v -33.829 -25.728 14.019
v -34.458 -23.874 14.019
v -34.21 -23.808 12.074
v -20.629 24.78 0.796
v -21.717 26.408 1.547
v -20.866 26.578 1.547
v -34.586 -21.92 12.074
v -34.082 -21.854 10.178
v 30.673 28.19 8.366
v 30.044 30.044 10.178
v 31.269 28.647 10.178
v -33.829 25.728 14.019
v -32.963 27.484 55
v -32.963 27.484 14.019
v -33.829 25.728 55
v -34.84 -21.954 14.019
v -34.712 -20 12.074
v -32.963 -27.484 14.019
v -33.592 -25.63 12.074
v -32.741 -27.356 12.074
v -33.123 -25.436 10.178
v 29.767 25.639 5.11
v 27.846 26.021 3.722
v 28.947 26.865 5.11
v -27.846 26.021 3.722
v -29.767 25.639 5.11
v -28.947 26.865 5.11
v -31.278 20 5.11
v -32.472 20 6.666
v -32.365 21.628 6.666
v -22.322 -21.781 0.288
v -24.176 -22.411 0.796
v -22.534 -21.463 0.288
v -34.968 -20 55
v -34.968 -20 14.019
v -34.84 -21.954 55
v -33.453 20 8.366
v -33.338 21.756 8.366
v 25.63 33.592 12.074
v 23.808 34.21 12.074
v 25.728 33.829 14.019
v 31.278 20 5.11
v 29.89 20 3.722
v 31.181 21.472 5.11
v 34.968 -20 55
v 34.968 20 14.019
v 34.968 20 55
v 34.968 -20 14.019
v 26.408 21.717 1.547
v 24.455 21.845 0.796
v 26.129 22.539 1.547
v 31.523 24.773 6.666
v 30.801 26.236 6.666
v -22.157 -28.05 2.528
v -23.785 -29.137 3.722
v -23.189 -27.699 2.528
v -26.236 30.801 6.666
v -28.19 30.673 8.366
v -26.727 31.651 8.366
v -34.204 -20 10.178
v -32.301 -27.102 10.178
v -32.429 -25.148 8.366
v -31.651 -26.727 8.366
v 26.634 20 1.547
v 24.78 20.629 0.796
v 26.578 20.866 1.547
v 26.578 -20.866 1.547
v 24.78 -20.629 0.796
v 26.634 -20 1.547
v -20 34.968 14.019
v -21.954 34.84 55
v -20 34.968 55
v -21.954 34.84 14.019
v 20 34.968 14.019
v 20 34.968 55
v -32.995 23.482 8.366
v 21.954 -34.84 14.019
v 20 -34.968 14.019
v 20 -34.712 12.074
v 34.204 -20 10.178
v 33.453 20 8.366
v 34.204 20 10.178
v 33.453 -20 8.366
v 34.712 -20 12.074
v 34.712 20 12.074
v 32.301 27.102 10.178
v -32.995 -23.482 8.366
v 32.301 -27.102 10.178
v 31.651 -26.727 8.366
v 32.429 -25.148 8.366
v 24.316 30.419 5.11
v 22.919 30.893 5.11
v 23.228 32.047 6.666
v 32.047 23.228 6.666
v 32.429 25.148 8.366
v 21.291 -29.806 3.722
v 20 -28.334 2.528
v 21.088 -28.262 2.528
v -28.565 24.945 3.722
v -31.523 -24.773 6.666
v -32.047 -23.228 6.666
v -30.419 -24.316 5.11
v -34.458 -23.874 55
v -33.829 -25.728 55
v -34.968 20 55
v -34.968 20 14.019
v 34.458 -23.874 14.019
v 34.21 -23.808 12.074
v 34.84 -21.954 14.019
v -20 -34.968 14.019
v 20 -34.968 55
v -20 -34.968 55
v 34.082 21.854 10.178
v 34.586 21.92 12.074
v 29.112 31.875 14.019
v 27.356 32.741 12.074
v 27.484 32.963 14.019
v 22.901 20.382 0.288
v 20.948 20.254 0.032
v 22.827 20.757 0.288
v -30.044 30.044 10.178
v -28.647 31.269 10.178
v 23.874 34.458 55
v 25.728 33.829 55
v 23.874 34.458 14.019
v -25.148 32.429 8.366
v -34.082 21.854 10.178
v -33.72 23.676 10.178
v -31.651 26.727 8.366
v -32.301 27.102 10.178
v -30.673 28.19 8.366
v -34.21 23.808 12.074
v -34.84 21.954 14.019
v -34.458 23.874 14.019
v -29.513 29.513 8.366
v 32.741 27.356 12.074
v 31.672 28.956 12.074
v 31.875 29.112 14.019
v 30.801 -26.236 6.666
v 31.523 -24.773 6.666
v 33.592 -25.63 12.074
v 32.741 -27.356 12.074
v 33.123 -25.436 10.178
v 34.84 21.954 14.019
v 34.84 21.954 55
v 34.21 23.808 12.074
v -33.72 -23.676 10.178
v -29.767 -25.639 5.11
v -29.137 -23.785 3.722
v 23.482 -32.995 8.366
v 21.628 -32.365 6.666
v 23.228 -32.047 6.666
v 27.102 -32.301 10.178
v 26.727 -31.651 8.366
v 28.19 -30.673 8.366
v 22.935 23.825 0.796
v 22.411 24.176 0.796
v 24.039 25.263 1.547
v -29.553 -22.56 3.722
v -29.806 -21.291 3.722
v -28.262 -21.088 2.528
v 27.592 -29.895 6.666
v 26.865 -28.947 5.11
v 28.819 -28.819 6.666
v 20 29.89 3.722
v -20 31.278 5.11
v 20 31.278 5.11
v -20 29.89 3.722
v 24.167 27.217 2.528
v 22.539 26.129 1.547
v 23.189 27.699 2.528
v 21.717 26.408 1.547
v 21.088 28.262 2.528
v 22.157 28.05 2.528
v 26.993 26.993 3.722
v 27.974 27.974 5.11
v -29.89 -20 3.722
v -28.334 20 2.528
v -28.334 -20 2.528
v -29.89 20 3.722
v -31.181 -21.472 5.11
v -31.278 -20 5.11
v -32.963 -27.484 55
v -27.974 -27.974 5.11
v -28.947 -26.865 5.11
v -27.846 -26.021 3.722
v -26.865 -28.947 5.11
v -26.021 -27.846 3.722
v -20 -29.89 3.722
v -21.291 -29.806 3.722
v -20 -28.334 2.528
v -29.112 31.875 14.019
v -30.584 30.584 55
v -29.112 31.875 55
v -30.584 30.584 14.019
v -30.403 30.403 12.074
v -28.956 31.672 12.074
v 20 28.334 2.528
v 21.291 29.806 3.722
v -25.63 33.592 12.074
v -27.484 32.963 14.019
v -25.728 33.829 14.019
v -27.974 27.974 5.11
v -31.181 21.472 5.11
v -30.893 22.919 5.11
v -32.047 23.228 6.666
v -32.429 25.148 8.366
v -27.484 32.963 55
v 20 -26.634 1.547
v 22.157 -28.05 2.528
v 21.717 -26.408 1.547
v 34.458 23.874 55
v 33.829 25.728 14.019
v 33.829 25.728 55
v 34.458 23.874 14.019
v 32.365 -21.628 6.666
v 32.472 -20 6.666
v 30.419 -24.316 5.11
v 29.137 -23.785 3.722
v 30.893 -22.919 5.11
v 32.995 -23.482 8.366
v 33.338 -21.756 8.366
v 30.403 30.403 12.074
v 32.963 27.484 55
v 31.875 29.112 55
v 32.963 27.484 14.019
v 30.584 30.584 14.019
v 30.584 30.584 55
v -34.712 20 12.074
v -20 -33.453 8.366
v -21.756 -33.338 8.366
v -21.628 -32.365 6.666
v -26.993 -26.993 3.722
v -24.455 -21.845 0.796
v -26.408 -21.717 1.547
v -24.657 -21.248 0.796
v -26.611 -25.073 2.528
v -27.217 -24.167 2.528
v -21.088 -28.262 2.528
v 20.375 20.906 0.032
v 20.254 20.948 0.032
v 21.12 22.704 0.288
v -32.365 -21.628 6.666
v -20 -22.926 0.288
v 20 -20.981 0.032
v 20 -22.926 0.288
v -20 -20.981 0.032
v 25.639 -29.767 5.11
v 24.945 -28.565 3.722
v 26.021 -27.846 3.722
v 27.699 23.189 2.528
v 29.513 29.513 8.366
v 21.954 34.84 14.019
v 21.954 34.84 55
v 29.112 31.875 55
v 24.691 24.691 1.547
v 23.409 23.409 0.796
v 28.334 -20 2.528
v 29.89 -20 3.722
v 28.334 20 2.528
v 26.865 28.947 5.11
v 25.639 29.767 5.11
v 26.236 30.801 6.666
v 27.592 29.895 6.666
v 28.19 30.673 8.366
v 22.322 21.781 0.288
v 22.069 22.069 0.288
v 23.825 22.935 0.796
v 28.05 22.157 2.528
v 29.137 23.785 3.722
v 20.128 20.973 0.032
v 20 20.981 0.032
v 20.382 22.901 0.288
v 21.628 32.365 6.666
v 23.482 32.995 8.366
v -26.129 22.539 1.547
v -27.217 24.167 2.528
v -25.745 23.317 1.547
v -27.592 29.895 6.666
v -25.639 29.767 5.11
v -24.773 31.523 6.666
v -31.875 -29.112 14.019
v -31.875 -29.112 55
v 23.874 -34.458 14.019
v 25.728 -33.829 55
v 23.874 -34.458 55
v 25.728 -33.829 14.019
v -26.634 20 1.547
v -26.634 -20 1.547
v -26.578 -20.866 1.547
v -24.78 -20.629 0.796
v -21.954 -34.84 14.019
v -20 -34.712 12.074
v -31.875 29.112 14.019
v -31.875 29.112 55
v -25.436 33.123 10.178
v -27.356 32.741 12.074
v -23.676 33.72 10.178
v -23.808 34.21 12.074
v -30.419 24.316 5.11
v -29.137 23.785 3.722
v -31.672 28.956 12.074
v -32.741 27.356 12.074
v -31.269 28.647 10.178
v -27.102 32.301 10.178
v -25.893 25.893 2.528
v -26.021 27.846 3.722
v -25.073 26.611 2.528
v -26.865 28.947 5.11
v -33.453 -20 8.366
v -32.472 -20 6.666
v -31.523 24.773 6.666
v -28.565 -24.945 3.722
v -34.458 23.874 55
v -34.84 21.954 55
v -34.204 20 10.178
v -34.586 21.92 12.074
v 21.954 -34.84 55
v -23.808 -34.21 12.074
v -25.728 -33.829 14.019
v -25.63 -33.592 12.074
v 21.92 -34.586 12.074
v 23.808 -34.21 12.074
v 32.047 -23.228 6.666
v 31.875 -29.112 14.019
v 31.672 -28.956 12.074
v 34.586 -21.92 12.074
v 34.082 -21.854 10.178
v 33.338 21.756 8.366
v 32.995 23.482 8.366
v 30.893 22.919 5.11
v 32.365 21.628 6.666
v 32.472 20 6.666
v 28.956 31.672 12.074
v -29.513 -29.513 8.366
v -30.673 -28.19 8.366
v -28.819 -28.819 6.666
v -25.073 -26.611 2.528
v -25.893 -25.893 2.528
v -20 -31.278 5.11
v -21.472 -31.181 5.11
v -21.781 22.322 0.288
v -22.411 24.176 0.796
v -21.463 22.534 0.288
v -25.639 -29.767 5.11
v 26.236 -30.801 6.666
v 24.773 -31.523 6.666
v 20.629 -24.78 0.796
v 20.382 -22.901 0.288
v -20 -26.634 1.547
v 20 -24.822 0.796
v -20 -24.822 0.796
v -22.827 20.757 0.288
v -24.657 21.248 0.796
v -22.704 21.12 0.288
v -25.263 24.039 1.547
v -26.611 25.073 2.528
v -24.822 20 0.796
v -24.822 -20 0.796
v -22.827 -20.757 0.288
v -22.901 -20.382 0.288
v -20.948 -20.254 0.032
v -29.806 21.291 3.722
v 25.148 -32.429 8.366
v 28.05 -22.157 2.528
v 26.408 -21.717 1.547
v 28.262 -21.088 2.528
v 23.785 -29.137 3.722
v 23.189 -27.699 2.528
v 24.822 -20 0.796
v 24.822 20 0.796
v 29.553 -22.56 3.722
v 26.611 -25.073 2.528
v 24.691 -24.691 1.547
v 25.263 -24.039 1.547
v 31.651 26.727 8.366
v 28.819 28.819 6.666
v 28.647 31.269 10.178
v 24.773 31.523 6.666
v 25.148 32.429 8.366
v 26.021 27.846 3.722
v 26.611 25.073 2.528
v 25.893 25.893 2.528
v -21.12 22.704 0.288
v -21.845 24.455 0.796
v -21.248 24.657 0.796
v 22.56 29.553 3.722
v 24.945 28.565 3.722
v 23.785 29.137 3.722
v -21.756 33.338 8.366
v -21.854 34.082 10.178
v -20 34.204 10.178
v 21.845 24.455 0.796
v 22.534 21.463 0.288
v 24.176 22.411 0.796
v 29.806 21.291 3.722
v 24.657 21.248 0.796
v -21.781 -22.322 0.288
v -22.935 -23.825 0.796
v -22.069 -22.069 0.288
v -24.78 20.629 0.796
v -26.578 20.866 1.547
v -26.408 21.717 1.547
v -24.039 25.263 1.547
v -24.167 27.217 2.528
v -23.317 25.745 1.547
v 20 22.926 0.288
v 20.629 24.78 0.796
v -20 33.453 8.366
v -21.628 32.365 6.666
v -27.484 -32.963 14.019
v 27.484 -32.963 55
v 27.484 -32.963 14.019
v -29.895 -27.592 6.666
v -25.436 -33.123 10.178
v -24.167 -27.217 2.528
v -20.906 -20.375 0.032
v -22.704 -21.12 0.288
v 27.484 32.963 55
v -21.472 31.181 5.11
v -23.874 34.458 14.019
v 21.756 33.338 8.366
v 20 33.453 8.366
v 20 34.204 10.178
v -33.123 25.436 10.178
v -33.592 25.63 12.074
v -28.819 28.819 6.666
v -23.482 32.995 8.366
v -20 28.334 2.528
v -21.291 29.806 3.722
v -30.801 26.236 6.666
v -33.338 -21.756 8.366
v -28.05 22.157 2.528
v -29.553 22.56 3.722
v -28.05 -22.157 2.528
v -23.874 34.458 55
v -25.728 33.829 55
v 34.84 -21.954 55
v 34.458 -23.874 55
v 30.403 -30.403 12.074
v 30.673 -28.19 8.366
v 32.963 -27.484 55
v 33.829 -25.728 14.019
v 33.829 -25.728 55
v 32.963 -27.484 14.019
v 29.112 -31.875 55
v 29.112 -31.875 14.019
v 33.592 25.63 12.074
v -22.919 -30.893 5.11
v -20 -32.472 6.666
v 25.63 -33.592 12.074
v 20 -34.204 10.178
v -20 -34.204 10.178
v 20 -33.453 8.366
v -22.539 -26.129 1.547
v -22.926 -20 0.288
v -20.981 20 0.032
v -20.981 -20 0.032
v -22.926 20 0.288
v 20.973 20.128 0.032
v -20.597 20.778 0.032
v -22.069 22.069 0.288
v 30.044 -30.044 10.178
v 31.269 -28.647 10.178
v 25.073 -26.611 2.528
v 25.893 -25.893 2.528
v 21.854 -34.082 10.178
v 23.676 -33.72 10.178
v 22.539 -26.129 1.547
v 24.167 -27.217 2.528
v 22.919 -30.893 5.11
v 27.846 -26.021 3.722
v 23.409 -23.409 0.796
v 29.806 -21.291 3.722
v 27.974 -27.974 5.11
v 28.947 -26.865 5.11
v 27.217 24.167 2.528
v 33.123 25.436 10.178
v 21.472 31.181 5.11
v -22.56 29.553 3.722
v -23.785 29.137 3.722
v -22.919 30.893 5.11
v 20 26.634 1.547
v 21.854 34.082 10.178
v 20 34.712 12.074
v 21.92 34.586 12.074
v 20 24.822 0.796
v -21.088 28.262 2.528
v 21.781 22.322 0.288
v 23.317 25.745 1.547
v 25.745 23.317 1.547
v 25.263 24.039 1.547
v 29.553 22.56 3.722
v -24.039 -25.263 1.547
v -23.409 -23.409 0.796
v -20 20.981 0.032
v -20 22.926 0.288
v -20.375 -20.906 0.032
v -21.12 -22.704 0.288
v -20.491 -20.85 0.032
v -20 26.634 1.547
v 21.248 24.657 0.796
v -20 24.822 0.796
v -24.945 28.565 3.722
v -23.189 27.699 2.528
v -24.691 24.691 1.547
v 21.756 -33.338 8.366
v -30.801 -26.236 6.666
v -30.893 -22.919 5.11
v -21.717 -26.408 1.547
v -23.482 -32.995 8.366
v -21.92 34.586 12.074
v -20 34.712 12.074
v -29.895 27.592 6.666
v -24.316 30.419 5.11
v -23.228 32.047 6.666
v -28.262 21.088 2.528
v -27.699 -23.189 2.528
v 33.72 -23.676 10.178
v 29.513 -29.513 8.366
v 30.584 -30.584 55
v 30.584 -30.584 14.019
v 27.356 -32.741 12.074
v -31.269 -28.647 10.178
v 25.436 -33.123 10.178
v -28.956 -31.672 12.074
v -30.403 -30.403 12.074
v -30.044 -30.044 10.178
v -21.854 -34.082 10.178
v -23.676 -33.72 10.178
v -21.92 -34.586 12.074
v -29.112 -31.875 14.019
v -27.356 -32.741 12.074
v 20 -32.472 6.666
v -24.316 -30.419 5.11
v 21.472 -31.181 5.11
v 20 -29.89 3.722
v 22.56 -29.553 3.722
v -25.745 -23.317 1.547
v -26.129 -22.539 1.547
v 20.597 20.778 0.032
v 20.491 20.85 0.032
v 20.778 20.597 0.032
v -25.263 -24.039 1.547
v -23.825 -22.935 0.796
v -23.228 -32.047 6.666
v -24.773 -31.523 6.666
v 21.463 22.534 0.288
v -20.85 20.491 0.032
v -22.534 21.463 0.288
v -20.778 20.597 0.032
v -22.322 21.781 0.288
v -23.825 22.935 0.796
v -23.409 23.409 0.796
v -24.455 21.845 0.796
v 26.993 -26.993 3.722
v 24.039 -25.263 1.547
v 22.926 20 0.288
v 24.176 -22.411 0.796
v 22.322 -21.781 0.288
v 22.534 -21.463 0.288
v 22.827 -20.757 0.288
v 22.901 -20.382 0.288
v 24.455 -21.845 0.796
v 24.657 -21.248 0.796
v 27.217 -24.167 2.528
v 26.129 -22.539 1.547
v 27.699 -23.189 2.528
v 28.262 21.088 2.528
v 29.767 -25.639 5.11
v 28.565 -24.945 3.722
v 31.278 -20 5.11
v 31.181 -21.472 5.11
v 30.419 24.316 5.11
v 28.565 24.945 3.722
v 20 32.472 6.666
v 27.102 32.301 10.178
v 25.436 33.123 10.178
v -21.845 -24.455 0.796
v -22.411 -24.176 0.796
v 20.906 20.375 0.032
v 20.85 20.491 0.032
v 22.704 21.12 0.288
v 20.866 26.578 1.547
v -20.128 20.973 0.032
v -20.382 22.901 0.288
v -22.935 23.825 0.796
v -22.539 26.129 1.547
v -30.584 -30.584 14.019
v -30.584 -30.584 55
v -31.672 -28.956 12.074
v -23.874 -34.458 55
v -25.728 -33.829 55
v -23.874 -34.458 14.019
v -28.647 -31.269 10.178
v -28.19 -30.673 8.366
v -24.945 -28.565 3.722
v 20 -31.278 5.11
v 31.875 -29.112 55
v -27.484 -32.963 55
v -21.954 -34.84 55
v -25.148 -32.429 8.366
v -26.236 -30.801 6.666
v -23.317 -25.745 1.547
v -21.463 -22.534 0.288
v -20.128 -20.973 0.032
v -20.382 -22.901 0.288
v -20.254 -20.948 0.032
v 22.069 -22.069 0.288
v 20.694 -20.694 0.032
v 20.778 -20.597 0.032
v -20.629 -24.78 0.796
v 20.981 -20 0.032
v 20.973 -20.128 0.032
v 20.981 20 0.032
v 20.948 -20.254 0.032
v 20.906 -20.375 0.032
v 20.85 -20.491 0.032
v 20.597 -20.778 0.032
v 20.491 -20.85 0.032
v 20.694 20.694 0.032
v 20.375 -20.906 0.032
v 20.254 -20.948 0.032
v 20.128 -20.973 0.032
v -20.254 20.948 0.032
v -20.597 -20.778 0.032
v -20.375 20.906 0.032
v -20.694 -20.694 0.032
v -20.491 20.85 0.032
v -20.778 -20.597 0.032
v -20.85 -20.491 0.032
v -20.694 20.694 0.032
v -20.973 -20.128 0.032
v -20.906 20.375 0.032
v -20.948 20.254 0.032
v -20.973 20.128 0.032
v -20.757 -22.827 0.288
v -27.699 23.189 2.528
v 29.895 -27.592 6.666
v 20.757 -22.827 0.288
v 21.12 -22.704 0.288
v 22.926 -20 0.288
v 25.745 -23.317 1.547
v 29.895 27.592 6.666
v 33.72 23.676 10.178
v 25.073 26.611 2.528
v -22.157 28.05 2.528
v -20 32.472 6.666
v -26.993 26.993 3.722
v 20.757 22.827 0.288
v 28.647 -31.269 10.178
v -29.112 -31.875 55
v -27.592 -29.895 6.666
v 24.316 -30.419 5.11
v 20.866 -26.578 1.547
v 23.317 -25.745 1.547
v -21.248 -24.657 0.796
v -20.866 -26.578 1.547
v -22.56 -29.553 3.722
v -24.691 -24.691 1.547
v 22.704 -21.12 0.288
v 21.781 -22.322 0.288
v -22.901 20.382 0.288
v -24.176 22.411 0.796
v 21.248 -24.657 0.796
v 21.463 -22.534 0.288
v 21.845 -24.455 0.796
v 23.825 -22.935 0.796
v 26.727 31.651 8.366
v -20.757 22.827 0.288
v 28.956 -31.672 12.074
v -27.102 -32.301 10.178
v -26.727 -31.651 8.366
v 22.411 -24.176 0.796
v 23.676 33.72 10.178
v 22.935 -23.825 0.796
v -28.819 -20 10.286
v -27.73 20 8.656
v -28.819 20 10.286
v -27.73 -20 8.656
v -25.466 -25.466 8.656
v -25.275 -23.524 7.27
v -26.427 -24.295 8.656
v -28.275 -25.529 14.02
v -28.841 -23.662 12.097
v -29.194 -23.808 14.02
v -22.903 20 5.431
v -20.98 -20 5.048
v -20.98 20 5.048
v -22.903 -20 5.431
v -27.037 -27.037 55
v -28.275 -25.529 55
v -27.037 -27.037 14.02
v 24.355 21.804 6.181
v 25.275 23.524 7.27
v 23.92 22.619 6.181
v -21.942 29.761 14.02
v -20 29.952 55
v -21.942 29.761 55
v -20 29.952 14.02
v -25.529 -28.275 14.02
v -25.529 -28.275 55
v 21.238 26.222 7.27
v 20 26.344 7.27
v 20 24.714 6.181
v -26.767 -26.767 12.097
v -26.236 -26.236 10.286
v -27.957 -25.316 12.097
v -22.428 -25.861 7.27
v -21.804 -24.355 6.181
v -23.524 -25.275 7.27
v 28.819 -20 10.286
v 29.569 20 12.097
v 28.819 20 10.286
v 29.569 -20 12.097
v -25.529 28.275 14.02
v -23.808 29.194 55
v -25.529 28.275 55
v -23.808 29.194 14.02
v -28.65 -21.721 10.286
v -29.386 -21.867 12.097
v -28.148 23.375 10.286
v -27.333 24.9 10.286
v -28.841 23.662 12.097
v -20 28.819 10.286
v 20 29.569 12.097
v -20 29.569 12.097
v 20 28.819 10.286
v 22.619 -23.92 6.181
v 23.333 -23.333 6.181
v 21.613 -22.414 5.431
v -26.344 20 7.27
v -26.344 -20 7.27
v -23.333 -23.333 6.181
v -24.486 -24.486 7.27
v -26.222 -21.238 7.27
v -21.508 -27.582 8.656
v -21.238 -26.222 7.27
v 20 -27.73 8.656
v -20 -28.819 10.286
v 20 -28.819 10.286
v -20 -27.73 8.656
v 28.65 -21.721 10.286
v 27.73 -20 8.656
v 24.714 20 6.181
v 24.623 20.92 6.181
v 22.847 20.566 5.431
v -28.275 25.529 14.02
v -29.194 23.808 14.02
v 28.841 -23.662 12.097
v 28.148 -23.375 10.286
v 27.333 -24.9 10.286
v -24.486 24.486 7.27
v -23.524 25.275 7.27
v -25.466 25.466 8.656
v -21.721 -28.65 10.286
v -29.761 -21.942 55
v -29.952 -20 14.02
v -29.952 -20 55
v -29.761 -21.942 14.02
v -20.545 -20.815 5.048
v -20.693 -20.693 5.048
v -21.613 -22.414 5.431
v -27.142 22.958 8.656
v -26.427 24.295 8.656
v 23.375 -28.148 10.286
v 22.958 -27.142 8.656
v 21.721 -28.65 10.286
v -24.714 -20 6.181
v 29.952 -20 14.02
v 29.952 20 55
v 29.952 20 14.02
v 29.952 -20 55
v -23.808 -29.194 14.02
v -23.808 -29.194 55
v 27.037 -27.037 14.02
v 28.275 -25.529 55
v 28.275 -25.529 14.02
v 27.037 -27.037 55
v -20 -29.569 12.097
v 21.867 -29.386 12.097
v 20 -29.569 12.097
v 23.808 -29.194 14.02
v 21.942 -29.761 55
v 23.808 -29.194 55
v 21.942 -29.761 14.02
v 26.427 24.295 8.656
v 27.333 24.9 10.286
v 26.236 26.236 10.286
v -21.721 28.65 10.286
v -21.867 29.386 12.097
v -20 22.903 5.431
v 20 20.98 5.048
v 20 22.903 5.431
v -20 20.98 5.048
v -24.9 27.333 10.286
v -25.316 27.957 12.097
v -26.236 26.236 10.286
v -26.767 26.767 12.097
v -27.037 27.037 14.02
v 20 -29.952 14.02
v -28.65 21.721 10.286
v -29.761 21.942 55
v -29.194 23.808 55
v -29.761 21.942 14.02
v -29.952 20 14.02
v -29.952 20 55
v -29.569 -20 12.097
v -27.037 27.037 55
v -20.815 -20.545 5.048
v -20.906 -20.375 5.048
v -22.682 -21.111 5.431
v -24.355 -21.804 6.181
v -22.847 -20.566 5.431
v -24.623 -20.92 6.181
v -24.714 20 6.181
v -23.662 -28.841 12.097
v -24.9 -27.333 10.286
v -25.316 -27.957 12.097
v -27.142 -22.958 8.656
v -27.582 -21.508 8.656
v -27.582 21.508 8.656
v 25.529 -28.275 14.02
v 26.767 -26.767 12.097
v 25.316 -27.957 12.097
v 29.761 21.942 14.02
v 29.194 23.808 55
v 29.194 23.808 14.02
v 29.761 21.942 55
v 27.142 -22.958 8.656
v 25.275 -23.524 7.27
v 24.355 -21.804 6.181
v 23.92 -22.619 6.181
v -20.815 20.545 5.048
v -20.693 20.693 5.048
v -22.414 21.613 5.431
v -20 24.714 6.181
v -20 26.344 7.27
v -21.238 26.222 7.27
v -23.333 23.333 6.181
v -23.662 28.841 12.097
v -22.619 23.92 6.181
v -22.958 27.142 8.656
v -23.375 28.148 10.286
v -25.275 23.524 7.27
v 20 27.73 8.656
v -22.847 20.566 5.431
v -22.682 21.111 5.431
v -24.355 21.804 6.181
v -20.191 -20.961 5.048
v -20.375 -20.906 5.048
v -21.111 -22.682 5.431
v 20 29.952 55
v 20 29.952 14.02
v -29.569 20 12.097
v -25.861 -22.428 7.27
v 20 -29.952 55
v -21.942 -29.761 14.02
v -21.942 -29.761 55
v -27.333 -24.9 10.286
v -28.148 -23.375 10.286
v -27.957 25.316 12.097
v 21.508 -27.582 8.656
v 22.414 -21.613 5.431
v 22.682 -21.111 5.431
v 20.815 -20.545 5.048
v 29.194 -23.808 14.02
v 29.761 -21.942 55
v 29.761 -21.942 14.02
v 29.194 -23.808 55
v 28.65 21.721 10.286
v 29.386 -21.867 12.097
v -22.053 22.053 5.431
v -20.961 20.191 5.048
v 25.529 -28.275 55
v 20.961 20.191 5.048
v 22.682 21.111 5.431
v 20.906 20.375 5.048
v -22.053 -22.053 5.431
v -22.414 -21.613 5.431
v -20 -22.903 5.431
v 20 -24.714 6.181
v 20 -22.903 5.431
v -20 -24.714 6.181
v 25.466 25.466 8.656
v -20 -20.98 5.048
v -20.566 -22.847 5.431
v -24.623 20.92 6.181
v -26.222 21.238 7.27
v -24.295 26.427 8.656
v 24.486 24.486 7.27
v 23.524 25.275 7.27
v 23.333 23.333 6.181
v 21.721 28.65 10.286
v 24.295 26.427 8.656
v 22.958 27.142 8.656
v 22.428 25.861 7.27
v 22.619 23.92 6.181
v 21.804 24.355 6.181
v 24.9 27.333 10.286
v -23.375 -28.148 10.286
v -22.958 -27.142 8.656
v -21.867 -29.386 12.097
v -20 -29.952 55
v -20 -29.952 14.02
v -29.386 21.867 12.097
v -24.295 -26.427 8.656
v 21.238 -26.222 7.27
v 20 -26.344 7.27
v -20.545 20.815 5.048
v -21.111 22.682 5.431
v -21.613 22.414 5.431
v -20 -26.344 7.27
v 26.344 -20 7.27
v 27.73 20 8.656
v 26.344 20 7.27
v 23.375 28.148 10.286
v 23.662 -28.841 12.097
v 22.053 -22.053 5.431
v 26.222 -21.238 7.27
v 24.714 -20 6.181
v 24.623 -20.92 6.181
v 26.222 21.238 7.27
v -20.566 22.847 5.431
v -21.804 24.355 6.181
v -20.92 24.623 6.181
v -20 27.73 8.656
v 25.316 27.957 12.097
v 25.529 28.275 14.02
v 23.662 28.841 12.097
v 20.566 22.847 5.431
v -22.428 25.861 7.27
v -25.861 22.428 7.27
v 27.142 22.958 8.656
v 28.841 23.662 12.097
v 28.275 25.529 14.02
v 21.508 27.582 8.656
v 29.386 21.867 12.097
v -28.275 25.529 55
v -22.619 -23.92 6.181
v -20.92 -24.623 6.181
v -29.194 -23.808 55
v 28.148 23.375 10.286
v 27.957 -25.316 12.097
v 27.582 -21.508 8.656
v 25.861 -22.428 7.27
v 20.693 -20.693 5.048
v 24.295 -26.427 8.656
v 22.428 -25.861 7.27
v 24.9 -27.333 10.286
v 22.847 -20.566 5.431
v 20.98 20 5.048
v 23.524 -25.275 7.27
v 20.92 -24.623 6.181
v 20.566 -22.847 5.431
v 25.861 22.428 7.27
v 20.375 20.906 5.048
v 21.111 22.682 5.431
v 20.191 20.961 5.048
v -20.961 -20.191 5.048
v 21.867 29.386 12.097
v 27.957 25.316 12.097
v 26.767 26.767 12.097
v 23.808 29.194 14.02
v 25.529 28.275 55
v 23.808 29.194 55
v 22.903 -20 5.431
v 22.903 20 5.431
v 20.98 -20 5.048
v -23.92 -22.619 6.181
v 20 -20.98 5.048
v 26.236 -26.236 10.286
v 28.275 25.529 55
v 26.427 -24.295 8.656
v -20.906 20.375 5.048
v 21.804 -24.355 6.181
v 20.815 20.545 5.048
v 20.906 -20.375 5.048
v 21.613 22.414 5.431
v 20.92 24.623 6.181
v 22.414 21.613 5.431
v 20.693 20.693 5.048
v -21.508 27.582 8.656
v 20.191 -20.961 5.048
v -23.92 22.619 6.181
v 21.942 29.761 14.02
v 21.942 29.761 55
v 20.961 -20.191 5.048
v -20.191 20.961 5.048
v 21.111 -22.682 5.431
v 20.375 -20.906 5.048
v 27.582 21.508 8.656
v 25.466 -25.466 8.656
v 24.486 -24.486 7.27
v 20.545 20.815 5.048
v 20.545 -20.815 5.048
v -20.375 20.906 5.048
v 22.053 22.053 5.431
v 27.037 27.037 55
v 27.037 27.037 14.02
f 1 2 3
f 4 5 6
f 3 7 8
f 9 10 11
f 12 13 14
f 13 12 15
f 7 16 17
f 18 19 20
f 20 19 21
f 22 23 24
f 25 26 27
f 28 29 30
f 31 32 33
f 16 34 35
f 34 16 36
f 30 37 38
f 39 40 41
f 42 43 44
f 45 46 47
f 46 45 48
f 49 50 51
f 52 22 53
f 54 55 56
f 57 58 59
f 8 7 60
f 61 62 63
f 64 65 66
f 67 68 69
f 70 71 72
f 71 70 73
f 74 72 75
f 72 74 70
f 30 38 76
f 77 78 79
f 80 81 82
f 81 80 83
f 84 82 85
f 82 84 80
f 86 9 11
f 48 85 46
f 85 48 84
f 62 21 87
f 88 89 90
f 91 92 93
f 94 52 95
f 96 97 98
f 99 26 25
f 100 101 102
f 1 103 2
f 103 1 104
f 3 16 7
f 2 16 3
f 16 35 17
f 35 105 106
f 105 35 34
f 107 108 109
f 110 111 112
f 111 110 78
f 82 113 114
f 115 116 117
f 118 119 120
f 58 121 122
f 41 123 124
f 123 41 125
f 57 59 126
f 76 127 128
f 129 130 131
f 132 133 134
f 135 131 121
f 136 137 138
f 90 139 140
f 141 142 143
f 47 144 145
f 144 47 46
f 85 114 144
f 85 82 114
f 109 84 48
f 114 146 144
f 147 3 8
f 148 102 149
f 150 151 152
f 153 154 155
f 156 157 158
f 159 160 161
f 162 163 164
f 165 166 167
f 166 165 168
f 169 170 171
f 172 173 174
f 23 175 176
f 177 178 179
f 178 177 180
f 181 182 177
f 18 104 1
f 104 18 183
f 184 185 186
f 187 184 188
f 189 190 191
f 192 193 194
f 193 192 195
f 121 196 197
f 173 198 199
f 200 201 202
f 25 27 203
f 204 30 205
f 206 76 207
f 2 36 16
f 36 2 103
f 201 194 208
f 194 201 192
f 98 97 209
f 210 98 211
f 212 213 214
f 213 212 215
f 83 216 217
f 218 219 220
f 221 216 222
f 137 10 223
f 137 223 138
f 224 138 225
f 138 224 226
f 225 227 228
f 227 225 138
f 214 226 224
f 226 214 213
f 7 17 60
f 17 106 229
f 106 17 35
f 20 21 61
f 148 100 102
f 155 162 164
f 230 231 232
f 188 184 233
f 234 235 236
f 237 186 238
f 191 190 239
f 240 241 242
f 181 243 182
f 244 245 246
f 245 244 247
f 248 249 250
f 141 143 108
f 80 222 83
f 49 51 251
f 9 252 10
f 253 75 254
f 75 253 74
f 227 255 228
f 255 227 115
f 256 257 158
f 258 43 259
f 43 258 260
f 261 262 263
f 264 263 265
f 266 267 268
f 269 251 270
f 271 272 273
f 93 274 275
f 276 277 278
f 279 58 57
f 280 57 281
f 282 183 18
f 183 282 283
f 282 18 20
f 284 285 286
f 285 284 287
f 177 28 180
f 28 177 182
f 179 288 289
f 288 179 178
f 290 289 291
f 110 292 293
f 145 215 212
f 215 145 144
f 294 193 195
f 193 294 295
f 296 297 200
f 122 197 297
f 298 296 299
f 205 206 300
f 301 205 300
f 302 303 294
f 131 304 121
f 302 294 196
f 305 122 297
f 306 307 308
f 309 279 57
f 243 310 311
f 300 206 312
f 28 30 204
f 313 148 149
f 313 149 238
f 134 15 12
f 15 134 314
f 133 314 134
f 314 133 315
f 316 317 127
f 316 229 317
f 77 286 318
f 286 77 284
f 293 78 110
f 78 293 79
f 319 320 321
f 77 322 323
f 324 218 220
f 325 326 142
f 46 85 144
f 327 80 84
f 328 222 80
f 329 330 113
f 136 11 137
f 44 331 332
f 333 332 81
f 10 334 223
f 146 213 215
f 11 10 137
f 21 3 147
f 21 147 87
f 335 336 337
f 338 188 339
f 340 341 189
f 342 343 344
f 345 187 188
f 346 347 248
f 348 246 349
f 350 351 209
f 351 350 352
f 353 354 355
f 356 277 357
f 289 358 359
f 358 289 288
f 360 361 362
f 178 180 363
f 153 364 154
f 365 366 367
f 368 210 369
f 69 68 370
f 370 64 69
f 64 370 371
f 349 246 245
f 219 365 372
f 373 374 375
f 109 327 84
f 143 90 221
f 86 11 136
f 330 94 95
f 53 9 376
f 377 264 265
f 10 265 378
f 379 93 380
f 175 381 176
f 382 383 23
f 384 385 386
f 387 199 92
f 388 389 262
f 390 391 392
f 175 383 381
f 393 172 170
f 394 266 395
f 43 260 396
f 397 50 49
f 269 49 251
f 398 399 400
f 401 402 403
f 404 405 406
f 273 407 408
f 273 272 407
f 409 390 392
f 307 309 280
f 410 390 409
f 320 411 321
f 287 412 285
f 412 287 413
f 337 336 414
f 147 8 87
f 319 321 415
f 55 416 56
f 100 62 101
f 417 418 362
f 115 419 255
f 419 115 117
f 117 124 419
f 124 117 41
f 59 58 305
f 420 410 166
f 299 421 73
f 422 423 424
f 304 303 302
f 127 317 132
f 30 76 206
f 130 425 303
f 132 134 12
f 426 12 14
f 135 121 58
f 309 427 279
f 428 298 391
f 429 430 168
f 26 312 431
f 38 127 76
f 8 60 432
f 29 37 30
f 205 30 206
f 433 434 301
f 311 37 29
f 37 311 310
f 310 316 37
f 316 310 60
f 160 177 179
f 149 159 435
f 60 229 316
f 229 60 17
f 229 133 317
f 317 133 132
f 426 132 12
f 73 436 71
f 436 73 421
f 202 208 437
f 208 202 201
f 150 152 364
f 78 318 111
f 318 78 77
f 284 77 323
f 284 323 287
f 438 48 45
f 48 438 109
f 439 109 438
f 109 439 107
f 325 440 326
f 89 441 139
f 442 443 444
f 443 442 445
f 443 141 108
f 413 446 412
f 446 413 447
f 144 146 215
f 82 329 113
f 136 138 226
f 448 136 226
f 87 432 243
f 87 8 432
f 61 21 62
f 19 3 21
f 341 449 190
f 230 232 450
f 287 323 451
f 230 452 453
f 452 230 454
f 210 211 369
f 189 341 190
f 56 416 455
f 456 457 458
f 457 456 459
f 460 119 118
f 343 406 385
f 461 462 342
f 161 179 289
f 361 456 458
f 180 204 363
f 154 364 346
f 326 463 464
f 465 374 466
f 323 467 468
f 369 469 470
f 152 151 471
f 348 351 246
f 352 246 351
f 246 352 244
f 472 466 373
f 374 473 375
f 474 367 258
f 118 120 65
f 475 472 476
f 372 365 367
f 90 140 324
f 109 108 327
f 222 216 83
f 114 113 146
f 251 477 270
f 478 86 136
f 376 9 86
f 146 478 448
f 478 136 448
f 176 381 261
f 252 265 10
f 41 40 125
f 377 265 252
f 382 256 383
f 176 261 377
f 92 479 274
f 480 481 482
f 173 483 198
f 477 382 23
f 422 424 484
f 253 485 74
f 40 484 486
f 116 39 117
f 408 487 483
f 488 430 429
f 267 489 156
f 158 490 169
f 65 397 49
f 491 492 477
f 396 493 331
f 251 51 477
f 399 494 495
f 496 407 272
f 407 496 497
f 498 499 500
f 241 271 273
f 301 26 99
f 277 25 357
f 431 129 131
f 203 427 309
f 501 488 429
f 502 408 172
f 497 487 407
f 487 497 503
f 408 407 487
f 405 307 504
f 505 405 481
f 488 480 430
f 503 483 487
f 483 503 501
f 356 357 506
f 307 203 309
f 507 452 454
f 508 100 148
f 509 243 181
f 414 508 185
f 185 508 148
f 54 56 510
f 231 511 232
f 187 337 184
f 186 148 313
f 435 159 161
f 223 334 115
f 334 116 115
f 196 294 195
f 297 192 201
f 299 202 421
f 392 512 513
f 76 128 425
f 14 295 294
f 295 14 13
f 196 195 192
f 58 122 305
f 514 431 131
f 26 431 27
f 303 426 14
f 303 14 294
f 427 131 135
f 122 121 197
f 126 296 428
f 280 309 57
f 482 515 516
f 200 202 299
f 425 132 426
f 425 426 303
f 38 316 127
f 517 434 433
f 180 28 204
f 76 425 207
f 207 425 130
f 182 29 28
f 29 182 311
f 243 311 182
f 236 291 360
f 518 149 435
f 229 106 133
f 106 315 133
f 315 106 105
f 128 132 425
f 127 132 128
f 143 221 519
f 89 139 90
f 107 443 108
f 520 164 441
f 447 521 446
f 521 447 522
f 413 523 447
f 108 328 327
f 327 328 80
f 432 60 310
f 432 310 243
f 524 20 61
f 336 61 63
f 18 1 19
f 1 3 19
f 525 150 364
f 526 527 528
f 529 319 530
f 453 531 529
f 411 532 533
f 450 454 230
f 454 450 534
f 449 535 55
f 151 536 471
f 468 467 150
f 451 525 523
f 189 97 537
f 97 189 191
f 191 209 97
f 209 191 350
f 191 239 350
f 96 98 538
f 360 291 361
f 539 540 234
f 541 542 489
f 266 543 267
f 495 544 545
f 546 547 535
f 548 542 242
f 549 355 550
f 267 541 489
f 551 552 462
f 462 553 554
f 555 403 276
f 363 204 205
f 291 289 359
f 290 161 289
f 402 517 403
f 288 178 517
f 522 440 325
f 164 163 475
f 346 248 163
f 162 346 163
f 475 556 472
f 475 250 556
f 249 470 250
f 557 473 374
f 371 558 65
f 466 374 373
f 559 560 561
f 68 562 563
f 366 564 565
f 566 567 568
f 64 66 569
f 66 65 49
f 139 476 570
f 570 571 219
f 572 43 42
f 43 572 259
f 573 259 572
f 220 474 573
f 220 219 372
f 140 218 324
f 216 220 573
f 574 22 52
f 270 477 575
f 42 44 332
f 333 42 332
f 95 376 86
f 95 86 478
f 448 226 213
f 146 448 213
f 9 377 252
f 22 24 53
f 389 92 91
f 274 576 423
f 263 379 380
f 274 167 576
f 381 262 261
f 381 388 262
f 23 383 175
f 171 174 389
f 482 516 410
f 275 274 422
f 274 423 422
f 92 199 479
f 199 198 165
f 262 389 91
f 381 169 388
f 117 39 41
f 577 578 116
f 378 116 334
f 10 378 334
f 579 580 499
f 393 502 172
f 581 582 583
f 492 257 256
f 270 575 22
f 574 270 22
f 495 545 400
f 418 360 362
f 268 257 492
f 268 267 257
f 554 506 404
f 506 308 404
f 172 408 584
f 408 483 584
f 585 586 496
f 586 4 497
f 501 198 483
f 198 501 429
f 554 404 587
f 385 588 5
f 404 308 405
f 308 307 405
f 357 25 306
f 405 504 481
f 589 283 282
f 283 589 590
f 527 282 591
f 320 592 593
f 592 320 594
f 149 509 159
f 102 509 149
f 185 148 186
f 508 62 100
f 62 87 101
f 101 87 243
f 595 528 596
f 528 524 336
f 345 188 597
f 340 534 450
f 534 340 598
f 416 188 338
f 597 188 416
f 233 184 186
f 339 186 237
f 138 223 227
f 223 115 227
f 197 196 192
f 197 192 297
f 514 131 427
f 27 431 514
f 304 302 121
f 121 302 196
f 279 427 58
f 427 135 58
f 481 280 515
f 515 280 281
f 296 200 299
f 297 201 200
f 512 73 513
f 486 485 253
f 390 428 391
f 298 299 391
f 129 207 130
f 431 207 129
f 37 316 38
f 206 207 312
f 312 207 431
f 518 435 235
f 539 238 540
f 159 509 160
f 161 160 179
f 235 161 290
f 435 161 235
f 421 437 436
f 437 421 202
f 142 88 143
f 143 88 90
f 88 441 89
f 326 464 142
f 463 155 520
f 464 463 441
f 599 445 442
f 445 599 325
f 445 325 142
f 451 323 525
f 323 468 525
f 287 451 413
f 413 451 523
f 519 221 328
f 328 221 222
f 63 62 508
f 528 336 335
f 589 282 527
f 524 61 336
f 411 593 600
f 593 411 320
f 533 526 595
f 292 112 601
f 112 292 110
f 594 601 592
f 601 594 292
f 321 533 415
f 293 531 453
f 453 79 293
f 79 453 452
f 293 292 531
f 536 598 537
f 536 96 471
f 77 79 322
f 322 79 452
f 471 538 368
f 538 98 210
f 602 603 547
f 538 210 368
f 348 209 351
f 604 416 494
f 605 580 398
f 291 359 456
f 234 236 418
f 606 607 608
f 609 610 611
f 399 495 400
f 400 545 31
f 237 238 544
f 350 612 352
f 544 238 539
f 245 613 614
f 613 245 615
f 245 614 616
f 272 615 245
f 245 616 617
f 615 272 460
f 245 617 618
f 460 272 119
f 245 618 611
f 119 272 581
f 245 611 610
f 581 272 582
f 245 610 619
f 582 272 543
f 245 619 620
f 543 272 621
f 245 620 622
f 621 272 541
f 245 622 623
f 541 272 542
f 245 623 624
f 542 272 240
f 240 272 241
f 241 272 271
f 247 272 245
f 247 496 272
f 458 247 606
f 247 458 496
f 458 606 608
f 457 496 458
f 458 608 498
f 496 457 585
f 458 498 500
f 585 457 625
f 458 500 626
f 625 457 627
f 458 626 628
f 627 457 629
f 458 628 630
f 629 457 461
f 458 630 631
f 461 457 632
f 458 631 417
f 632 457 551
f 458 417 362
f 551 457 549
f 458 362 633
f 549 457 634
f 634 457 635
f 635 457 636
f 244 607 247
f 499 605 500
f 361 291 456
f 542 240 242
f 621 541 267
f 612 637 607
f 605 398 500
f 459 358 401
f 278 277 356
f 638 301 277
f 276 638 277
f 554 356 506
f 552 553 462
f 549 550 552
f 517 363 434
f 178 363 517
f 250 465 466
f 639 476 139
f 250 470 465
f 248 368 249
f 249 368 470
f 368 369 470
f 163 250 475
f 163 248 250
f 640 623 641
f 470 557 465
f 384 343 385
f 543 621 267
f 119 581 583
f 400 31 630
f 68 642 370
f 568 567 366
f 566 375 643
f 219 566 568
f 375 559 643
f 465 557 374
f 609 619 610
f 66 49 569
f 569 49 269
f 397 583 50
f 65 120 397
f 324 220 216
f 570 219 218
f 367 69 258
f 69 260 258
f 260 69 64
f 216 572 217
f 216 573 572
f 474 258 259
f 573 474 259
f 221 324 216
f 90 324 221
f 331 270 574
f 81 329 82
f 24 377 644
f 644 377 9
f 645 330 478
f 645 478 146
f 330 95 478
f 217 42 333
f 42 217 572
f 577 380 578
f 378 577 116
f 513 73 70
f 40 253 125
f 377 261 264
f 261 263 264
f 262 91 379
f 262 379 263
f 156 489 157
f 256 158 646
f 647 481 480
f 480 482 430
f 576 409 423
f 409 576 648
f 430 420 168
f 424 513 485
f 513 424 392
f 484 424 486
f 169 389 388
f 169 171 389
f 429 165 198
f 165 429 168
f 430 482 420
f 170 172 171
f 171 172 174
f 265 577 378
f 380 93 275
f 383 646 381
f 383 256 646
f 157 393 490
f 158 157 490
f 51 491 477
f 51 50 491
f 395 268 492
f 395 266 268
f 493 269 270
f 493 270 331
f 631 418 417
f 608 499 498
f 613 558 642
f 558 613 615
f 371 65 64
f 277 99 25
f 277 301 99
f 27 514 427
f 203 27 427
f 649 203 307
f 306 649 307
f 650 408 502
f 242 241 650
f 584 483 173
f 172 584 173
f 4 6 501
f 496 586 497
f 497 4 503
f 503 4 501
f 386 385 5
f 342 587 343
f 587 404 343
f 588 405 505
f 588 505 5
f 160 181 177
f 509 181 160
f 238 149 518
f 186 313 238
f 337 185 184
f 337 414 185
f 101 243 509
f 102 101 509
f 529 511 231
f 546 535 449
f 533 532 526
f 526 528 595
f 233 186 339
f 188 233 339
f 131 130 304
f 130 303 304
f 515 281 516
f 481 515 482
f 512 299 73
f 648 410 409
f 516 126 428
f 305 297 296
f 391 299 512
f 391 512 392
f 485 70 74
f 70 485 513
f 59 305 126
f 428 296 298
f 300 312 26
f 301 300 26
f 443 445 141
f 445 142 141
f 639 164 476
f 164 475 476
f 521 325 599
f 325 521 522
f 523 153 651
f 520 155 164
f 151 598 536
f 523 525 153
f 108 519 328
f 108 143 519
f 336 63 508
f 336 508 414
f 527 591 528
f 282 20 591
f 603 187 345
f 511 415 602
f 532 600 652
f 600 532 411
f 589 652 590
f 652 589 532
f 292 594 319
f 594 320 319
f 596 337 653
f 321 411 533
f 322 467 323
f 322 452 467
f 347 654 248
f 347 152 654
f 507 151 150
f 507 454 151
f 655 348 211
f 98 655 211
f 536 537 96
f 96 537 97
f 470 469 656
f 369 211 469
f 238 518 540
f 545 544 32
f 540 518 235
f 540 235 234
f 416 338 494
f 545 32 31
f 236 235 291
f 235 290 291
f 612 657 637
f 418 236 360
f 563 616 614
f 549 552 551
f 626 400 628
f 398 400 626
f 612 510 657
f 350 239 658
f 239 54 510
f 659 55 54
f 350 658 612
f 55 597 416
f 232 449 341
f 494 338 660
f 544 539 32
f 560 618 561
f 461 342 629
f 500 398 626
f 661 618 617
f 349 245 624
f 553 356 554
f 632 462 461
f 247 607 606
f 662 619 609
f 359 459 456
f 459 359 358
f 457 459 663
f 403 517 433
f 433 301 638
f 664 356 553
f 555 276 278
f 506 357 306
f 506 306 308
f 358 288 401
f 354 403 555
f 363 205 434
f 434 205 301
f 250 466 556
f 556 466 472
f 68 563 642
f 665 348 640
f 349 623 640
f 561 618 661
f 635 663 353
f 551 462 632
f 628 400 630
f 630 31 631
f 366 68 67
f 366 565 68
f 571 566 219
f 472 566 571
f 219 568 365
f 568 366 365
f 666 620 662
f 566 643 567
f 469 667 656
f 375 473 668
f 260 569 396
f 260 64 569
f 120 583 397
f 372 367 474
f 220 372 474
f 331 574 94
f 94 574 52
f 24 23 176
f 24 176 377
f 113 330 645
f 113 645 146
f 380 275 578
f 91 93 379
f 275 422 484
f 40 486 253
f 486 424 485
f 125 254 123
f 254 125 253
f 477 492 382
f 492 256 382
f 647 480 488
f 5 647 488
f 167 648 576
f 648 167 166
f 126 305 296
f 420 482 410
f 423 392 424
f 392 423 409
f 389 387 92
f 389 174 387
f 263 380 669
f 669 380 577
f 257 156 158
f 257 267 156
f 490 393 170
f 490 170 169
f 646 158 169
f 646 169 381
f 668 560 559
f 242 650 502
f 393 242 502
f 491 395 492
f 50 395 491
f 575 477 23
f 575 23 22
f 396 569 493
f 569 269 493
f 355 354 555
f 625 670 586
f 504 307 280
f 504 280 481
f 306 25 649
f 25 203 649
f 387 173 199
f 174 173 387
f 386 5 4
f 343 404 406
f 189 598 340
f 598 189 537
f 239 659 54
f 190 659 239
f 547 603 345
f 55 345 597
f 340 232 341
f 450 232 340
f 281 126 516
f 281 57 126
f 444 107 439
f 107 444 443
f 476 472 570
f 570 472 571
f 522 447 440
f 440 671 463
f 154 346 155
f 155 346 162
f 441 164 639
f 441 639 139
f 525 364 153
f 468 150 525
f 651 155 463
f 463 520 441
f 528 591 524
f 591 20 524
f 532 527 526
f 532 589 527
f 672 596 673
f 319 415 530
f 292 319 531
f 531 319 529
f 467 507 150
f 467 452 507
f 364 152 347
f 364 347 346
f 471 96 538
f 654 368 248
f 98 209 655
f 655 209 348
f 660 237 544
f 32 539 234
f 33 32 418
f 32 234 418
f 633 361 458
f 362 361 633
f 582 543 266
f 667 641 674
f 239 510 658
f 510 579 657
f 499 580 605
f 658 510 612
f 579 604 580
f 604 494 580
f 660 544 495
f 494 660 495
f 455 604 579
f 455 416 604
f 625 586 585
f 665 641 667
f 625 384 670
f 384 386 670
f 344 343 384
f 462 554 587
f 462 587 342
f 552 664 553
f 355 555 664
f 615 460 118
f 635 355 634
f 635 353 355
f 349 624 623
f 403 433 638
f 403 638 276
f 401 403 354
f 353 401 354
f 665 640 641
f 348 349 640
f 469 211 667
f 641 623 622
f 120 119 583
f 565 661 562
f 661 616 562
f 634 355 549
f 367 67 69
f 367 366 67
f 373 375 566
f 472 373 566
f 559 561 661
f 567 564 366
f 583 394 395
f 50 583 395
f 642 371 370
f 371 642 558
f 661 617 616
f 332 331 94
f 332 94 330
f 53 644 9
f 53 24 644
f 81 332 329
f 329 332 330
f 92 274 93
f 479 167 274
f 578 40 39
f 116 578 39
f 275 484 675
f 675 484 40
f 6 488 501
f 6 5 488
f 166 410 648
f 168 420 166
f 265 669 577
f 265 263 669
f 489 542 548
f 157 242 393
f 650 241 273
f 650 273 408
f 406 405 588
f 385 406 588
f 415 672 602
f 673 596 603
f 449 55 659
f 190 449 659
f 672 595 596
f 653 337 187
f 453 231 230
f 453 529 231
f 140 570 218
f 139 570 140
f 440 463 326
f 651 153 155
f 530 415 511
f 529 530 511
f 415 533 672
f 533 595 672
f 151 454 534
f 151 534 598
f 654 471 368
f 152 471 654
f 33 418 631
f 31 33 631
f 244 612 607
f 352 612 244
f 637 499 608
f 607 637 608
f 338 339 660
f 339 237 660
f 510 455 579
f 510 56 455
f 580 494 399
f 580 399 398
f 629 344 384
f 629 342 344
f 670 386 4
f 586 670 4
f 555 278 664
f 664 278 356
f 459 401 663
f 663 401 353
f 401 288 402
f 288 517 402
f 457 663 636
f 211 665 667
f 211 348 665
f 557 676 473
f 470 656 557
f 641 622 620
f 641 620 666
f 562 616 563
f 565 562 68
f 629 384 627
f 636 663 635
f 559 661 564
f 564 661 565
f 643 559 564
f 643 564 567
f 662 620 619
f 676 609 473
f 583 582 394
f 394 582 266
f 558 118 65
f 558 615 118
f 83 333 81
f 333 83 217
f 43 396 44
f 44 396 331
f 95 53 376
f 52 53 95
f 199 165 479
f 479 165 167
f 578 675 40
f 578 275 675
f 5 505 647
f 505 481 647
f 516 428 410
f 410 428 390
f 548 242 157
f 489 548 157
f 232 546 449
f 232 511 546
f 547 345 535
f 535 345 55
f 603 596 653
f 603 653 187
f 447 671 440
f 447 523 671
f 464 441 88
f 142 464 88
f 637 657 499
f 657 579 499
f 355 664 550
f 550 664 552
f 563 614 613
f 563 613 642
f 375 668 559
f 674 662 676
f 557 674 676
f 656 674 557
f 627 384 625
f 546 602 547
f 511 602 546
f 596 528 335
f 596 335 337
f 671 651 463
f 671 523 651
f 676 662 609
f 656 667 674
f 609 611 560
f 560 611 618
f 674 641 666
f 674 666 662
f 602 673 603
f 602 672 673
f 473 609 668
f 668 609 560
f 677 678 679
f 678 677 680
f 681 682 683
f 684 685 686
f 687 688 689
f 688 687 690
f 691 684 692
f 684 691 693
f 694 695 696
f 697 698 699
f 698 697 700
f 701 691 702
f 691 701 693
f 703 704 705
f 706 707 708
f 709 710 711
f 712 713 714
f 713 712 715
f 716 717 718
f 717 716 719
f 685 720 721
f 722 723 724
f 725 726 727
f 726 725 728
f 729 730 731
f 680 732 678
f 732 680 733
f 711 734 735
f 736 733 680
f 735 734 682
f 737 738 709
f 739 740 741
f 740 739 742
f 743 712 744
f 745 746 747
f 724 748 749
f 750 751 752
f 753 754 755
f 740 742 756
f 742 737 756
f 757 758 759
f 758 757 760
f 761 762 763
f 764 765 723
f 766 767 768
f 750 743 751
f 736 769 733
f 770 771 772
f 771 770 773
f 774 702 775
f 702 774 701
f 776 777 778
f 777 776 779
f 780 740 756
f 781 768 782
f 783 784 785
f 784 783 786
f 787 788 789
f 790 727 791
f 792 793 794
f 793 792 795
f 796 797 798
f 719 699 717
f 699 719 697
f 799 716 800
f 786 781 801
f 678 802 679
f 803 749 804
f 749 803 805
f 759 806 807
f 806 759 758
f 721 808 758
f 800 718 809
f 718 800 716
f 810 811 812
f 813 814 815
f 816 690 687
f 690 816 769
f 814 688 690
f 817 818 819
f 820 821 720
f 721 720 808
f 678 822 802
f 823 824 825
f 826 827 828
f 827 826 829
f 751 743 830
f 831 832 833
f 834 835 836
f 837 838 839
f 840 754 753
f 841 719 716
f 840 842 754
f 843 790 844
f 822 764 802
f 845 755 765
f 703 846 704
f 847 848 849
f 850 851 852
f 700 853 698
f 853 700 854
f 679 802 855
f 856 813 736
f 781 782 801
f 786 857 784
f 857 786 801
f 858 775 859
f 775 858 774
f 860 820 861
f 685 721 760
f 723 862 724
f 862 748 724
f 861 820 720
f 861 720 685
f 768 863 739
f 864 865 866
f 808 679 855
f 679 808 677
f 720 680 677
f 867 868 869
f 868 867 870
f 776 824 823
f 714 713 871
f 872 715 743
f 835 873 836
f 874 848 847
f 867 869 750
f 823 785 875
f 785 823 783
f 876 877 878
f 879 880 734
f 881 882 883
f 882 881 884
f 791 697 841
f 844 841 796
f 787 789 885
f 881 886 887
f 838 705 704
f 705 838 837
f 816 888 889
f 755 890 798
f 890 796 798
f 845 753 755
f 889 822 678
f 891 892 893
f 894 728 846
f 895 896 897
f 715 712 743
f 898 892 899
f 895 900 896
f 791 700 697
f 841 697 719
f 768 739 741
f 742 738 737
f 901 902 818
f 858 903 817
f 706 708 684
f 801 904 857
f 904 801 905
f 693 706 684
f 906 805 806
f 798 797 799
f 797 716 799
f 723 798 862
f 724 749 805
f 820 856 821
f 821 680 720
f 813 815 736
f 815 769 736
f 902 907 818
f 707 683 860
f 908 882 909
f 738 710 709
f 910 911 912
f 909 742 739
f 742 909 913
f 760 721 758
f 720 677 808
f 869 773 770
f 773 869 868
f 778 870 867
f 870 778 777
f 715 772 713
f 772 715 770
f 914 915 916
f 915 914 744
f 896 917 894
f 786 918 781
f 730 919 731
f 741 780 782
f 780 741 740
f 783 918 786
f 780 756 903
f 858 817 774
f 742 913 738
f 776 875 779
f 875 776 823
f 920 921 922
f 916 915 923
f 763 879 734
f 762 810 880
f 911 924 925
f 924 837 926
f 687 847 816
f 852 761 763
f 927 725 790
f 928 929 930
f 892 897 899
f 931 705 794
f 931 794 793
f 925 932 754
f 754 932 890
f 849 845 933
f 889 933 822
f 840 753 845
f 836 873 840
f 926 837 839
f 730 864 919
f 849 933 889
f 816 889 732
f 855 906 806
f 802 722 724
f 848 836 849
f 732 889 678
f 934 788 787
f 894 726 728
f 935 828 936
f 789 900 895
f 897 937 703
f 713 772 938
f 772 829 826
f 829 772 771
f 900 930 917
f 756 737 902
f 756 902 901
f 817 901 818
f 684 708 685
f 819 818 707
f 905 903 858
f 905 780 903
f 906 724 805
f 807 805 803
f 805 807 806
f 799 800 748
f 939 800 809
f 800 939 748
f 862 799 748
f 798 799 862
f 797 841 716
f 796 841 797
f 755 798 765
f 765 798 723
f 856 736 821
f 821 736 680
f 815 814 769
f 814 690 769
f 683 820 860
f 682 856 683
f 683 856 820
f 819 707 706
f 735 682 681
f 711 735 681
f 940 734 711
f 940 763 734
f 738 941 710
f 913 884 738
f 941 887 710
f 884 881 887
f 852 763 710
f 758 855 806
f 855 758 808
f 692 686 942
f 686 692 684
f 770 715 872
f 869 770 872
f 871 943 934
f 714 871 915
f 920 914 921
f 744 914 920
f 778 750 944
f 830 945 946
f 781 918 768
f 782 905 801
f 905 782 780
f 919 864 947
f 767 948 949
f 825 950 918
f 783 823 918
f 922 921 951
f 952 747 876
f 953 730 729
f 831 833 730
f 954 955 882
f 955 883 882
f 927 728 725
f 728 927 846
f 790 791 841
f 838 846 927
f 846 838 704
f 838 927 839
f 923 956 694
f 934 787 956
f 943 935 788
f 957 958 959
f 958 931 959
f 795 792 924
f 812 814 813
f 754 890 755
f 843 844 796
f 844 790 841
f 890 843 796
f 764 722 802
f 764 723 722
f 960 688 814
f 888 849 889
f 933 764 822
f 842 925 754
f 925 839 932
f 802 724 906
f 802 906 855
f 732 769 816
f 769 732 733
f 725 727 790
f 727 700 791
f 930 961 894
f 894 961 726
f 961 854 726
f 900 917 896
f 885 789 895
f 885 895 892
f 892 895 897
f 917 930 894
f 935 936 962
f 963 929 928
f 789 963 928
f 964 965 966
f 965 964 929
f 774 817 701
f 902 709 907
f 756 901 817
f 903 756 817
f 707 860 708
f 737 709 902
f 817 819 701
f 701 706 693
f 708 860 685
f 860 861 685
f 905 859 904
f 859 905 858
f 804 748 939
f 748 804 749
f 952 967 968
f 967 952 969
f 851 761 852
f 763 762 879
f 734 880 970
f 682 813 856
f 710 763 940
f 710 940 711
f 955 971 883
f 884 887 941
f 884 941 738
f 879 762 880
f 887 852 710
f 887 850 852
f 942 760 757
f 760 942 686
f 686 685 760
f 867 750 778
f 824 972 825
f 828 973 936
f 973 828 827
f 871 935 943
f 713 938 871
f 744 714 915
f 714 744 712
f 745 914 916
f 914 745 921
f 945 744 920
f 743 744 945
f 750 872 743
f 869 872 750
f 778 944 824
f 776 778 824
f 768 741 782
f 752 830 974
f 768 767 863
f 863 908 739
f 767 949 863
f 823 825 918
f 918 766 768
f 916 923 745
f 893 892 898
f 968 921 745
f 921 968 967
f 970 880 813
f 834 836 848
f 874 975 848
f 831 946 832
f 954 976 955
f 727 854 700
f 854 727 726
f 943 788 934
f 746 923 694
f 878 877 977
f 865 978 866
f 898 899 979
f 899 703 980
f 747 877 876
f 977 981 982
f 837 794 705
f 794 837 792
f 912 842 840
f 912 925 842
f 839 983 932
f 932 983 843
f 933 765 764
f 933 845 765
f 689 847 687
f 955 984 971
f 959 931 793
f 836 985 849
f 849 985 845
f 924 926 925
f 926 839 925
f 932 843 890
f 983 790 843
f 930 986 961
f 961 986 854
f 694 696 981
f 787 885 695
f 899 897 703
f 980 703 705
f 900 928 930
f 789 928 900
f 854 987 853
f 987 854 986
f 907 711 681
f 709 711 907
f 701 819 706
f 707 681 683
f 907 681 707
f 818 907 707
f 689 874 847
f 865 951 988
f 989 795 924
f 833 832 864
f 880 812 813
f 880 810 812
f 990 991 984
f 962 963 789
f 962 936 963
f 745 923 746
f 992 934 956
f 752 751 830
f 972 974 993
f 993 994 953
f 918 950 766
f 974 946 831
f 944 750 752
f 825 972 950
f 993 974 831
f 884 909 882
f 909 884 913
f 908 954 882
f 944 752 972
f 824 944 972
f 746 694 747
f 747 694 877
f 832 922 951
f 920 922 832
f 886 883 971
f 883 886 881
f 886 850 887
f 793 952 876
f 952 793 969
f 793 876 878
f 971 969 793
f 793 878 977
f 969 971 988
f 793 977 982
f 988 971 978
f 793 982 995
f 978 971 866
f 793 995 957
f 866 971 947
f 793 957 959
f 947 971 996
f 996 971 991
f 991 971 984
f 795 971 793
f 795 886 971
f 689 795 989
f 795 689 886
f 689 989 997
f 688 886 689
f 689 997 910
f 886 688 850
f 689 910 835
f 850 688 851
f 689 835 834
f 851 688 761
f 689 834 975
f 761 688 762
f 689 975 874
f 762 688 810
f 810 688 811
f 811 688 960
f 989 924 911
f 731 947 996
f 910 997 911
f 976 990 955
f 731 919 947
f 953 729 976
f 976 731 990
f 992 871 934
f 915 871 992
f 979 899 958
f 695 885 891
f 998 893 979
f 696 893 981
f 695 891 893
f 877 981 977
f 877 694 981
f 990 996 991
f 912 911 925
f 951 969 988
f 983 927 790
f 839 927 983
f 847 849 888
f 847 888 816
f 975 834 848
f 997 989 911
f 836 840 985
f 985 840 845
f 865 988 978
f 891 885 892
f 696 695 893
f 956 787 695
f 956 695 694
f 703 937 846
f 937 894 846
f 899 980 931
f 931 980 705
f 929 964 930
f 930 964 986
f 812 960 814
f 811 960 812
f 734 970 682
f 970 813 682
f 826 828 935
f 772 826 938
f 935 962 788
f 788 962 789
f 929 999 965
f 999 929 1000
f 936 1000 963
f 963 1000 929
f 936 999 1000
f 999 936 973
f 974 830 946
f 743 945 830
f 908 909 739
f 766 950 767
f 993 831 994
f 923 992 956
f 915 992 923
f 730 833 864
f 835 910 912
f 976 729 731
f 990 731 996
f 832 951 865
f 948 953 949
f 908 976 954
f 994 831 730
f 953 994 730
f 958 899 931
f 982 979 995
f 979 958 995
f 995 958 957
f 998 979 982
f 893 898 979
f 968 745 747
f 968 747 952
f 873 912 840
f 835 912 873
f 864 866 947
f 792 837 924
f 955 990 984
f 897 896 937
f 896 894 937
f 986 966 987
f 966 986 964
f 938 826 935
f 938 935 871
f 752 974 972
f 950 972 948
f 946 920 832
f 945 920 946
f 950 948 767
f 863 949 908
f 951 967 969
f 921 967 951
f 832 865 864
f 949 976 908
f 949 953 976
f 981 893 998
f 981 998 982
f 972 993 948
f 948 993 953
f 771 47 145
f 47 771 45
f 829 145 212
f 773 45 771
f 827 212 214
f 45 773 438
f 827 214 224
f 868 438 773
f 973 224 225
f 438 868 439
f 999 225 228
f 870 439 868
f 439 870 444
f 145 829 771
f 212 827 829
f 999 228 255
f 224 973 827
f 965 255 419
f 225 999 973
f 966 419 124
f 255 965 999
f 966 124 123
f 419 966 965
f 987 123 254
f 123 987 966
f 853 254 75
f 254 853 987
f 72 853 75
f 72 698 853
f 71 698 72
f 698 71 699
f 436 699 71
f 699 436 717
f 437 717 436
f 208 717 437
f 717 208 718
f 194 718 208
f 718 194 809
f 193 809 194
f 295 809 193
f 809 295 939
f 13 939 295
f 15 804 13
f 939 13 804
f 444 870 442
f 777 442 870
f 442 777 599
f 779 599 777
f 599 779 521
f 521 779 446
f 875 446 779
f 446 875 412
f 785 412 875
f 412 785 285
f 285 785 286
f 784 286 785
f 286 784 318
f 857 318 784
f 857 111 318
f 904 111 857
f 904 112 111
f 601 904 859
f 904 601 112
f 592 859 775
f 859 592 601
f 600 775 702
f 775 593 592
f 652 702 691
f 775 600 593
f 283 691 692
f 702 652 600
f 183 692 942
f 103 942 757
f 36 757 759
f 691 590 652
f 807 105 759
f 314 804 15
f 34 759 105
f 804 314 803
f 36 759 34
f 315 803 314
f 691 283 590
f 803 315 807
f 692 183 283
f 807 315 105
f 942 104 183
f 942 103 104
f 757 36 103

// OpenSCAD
// [FL_INDEX: keywords="openscad, 3d_parametric, Box_with_rounded_corners__customizable, csg_solid" | COT="Parametric OpenSCAD design from 3DCodeverse"]
// Title: Box with rounded corners, customizable

//Make a box or a lid:
type="box";//[box,lid]

//Outer height of box with lid:
height=70;//[20:150]
//Outer width of box:
width=70;//[20:150]
//Outer depth of box:
depth=70;//[20:200]

//curvature of sides:
roundness=15;//[5:30]
// How smooth the rounded corners are. 10 is standard, 5 is quite smooth.
$fa=5;//[1:20]

//How thick the walls are:
thickness=5;//[1:20]

//How much space is between lid inset and inside of box:
wiggle_room=1;//[0:3]
//How deep the lid inset is:
flange_height=2;//[0:10]



inner_radius=roundness-thickness;
if(type=="lid"){
translate([-width/2+roundness,-depth/2+roundness,0]){
difference(){
	translate([0,0,roundness]){
	minkowski(){
		cube([width-2*roundness,depth-2*roundness,70-2*roundness]);
		sphere(roundness);}
}
translate([-roundness-1,-roundness-1,roundness])
cube([width+2,depth+2,roundness+70+1]);}
translate([wiggle_room/2,wiggle_room/2,roundness]){
	linear_extrude(height=flange_height){
		minkowski(){
		square([width-2*(inner_radius+thickness)-wiggle_room,depth-2*(inner_radius+thickness)-wiggle_room]);
	circle(inner_radius);}
}}}}

if (type=="box"){
if (inner_radius>0){
translate([-width/2+roundness,-depth/2+roundness,0]){
difference(){
	translate([0,0,roundness]){
	difference(){
	minkowski(){
		cube([width-2*roundness,depth-2*roundness,height-2*roundness]);
		sphere(roundness);}
	minkowski(){
		cube([width-2*(inner_radius+thickness),depth-2*(inner_radius+thickness),height-2*(thickness)]);
		sphere(inner_radius);}
}}
translate([-roundness,-roundness,height-roundness])
cube([width,depth,roundness+1]);}}}}
